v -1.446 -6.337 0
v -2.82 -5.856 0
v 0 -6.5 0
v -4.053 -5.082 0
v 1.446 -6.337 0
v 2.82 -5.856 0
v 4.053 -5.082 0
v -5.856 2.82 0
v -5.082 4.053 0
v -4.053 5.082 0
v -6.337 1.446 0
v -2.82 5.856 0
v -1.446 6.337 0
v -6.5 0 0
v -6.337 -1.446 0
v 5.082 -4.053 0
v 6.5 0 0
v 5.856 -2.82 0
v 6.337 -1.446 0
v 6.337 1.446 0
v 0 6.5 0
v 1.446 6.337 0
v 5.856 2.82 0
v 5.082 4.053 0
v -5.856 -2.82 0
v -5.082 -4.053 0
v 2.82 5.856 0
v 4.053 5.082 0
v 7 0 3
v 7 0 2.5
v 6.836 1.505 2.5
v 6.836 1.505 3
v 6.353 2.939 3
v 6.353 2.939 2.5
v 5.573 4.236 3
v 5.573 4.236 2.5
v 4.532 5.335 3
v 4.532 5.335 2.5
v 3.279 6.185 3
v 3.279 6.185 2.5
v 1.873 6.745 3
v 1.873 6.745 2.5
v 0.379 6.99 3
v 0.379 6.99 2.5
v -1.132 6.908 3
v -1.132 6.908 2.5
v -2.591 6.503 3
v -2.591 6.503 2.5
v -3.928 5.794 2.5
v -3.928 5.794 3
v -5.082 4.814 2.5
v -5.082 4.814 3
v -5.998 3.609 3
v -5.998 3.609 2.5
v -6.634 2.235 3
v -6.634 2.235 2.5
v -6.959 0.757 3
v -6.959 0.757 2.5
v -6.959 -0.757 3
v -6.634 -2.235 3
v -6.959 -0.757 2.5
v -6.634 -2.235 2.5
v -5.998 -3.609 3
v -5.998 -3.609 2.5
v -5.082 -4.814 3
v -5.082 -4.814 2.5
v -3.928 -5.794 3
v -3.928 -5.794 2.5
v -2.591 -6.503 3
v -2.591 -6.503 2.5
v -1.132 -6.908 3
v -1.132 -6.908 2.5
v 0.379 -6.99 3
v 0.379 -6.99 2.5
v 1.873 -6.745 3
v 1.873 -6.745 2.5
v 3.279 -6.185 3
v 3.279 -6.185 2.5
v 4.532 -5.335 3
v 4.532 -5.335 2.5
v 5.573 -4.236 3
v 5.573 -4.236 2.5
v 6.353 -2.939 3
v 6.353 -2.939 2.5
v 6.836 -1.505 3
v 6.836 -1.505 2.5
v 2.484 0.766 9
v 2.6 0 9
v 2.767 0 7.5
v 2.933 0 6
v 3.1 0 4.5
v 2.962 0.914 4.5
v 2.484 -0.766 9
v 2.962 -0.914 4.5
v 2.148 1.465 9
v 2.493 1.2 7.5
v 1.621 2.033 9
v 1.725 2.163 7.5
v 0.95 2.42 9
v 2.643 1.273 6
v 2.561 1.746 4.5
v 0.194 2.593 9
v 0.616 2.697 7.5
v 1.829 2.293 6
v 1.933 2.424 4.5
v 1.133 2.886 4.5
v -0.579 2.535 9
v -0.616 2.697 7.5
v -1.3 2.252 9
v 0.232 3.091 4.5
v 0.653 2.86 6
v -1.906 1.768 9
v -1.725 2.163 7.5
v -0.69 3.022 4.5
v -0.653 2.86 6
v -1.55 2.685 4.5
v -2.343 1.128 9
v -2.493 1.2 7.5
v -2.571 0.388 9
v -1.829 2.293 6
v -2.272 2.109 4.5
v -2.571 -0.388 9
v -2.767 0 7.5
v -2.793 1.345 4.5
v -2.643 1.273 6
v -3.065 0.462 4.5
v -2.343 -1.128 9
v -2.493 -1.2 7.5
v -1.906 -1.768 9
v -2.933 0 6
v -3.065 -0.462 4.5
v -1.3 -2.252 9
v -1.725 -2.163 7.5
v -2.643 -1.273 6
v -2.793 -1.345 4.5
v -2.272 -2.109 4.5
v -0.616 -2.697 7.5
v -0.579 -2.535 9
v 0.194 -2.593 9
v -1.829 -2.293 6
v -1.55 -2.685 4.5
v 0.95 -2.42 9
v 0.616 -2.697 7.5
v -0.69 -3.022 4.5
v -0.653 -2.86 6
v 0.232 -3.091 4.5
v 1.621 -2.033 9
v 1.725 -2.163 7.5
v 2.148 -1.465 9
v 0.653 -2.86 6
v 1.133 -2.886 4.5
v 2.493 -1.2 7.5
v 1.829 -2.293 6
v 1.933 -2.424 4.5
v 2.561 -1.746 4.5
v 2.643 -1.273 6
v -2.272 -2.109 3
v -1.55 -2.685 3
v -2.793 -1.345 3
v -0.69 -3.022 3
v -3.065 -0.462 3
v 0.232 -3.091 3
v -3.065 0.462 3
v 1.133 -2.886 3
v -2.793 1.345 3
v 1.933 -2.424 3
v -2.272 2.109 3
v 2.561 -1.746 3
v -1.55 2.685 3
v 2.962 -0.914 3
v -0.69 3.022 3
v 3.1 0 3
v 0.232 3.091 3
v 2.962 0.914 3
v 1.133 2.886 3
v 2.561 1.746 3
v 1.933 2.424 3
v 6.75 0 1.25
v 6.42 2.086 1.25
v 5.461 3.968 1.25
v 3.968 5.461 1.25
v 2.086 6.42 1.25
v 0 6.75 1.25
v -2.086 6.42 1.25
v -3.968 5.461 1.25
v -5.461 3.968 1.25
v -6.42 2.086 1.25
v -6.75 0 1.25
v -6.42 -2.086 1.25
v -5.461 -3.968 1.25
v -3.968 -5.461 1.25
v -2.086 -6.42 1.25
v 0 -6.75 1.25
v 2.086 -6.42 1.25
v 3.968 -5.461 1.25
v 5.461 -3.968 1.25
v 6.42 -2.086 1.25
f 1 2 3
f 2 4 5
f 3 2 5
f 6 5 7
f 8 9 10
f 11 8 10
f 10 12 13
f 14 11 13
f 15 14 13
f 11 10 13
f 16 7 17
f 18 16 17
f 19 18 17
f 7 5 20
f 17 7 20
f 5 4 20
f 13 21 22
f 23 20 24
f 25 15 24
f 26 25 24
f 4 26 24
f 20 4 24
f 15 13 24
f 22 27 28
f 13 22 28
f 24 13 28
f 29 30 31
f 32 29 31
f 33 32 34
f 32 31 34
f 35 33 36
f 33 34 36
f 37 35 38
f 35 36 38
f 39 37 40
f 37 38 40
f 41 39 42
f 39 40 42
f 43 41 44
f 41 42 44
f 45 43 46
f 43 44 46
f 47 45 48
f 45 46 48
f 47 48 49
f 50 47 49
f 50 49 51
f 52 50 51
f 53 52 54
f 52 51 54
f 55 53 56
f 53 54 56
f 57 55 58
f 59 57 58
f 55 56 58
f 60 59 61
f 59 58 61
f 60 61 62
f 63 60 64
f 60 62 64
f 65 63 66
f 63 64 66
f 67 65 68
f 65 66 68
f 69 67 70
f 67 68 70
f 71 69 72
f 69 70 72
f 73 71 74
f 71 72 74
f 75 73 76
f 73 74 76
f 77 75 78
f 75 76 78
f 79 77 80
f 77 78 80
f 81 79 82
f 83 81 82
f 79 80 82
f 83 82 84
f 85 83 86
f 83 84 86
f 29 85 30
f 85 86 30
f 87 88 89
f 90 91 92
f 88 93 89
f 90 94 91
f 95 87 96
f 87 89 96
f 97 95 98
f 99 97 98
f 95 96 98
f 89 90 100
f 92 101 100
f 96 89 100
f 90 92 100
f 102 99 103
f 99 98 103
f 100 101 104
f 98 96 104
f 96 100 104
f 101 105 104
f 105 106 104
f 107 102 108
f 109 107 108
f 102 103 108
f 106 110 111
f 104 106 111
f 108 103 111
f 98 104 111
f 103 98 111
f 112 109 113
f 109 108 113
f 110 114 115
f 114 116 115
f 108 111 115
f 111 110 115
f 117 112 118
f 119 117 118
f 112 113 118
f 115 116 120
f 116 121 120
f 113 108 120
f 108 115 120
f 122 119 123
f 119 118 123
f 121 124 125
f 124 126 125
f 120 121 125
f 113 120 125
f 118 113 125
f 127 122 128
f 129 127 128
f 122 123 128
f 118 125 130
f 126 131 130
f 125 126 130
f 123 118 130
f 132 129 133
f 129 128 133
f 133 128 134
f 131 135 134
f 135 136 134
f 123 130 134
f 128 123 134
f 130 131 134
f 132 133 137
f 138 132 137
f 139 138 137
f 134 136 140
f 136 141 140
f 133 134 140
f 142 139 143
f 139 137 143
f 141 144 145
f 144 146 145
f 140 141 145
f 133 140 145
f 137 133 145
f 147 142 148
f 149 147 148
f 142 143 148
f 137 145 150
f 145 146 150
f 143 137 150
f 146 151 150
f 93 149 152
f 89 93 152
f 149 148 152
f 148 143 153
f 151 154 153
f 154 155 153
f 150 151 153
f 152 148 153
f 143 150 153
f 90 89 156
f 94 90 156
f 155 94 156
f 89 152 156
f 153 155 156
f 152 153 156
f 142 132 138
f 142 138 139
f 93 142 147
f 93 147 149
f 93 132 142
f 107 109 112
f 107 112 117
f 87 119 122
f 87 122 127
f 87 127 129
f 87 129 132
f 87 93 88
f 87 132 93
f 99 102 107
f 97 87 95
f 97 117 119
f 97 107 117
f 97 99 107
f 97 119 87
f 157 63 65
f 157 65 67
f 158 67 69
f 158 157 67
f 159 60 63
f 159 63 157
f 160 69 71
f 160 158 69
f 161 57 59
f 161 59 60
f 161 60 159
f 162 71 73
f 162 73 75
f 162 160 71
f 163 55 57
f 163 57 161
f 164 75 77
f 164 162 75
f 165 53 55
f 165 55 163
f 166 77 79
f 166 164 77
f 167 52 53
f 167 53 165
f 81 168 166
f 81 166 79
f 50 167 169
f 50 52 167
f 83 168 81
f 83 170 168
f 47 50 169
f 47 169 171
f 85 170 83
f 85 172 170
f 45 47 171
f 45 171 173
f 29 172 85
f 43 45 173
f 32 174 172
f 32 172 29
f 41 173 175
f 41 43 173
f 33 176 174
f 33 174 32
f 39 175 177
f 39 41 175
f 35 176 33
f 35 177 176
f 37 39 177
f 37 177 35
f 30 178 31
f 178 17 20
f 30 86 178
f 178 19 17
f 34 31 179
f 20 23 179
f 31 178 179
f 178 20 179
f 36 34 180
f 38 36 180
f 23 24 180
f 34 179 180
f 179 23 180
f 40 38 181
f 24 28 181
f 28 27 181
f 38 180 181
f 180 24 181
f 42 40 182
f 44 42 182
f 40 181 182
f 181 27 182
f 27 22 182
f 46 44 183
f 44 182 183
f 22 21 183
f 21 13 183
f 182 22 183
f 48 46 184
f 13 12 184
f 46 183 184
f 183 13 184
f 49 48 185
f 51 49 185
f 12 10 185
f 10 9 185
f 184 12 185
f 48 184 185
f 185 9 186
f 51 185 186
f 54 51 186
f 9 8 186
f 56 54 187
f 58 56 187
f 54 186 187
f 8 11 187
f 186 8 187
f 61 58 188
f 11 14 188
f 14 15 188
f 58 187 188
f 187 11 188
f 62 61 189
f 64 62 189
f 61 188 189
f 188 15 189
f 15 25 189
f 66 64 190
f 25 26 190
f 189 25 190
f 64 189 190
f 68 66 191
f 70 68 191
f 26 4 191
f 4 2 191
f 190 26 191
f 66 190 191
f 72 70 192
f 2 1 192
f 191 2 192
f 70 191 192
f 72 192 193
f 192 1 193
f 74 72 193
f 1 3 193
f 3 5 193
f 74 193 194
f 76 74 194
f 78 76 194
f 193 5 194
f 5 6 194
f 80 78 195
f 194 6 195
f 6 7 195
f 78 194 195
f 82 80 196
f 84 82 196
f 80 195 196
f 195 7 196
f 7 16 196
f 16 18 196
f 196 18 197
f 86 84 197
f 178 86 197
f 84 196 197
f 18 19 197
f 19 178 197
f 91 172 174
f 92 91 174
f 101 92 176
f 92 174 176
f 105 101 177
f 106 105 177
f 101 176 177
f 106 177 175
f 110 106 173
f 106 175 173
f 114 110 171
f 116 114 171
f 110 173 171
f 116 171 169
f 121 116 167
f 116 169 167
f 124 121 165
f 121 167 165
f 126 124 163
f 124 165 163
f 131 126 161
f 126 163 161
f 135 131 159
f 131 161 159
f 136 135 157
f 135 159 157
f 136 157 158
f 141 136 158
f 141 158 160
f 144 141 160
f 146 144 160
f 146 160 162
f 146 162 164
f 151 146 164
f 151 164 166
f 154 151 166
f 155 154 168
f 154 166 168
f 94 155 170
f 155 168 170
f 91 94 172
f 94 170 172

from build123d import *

# Parameters (mm, degrees)
F0_R     = 7
F1_DEPTH = 3
F2_R     = 3.1
F3_DEPTH = 6
F4_SIZE2 = 4.5
F4_SIZE  = 0.5
F5_SIZE2 = 0.5
F5_SIZE  = 2.5


with BuildPart() as f1:
    # F0 (on Top) → F1 (new body)
    with BuildSketch(Plane.XY):
        Circle(F0_R)
    extrude(amount=F1_DEPTH)

    # F2 (on face) → F3 (join)
    with BuildSketch(Plane.XY.offset(3)):
        Circle(F2_R)
    extrude(amount=F3_DEPTH)

    # F4
    f4_edges = [f1.edges().sort_by_distance(p)[0] for p in [
        (-3.1, 0, 9),
    ]]
    f4_side = f1.faces().sort_by_distance((0, 0, 9))[0]
    chamfer(f4_edges, length=F4_SIZE, length2=F4_SIZE2, reference=f4_side)

    # F5
    f5_edges = [f1.edges().sort_by_distance(p)[0] for p in [
        (-7, 0, 0),
    ]]
    f5_side = f1.faces().sort_by_distance((-7, 0, 1.5))[0]
    chamfer(f5_edges, length=F5_SIZE, length2=F5_SIZE2, reference=f5_side)


solid = f1.part
